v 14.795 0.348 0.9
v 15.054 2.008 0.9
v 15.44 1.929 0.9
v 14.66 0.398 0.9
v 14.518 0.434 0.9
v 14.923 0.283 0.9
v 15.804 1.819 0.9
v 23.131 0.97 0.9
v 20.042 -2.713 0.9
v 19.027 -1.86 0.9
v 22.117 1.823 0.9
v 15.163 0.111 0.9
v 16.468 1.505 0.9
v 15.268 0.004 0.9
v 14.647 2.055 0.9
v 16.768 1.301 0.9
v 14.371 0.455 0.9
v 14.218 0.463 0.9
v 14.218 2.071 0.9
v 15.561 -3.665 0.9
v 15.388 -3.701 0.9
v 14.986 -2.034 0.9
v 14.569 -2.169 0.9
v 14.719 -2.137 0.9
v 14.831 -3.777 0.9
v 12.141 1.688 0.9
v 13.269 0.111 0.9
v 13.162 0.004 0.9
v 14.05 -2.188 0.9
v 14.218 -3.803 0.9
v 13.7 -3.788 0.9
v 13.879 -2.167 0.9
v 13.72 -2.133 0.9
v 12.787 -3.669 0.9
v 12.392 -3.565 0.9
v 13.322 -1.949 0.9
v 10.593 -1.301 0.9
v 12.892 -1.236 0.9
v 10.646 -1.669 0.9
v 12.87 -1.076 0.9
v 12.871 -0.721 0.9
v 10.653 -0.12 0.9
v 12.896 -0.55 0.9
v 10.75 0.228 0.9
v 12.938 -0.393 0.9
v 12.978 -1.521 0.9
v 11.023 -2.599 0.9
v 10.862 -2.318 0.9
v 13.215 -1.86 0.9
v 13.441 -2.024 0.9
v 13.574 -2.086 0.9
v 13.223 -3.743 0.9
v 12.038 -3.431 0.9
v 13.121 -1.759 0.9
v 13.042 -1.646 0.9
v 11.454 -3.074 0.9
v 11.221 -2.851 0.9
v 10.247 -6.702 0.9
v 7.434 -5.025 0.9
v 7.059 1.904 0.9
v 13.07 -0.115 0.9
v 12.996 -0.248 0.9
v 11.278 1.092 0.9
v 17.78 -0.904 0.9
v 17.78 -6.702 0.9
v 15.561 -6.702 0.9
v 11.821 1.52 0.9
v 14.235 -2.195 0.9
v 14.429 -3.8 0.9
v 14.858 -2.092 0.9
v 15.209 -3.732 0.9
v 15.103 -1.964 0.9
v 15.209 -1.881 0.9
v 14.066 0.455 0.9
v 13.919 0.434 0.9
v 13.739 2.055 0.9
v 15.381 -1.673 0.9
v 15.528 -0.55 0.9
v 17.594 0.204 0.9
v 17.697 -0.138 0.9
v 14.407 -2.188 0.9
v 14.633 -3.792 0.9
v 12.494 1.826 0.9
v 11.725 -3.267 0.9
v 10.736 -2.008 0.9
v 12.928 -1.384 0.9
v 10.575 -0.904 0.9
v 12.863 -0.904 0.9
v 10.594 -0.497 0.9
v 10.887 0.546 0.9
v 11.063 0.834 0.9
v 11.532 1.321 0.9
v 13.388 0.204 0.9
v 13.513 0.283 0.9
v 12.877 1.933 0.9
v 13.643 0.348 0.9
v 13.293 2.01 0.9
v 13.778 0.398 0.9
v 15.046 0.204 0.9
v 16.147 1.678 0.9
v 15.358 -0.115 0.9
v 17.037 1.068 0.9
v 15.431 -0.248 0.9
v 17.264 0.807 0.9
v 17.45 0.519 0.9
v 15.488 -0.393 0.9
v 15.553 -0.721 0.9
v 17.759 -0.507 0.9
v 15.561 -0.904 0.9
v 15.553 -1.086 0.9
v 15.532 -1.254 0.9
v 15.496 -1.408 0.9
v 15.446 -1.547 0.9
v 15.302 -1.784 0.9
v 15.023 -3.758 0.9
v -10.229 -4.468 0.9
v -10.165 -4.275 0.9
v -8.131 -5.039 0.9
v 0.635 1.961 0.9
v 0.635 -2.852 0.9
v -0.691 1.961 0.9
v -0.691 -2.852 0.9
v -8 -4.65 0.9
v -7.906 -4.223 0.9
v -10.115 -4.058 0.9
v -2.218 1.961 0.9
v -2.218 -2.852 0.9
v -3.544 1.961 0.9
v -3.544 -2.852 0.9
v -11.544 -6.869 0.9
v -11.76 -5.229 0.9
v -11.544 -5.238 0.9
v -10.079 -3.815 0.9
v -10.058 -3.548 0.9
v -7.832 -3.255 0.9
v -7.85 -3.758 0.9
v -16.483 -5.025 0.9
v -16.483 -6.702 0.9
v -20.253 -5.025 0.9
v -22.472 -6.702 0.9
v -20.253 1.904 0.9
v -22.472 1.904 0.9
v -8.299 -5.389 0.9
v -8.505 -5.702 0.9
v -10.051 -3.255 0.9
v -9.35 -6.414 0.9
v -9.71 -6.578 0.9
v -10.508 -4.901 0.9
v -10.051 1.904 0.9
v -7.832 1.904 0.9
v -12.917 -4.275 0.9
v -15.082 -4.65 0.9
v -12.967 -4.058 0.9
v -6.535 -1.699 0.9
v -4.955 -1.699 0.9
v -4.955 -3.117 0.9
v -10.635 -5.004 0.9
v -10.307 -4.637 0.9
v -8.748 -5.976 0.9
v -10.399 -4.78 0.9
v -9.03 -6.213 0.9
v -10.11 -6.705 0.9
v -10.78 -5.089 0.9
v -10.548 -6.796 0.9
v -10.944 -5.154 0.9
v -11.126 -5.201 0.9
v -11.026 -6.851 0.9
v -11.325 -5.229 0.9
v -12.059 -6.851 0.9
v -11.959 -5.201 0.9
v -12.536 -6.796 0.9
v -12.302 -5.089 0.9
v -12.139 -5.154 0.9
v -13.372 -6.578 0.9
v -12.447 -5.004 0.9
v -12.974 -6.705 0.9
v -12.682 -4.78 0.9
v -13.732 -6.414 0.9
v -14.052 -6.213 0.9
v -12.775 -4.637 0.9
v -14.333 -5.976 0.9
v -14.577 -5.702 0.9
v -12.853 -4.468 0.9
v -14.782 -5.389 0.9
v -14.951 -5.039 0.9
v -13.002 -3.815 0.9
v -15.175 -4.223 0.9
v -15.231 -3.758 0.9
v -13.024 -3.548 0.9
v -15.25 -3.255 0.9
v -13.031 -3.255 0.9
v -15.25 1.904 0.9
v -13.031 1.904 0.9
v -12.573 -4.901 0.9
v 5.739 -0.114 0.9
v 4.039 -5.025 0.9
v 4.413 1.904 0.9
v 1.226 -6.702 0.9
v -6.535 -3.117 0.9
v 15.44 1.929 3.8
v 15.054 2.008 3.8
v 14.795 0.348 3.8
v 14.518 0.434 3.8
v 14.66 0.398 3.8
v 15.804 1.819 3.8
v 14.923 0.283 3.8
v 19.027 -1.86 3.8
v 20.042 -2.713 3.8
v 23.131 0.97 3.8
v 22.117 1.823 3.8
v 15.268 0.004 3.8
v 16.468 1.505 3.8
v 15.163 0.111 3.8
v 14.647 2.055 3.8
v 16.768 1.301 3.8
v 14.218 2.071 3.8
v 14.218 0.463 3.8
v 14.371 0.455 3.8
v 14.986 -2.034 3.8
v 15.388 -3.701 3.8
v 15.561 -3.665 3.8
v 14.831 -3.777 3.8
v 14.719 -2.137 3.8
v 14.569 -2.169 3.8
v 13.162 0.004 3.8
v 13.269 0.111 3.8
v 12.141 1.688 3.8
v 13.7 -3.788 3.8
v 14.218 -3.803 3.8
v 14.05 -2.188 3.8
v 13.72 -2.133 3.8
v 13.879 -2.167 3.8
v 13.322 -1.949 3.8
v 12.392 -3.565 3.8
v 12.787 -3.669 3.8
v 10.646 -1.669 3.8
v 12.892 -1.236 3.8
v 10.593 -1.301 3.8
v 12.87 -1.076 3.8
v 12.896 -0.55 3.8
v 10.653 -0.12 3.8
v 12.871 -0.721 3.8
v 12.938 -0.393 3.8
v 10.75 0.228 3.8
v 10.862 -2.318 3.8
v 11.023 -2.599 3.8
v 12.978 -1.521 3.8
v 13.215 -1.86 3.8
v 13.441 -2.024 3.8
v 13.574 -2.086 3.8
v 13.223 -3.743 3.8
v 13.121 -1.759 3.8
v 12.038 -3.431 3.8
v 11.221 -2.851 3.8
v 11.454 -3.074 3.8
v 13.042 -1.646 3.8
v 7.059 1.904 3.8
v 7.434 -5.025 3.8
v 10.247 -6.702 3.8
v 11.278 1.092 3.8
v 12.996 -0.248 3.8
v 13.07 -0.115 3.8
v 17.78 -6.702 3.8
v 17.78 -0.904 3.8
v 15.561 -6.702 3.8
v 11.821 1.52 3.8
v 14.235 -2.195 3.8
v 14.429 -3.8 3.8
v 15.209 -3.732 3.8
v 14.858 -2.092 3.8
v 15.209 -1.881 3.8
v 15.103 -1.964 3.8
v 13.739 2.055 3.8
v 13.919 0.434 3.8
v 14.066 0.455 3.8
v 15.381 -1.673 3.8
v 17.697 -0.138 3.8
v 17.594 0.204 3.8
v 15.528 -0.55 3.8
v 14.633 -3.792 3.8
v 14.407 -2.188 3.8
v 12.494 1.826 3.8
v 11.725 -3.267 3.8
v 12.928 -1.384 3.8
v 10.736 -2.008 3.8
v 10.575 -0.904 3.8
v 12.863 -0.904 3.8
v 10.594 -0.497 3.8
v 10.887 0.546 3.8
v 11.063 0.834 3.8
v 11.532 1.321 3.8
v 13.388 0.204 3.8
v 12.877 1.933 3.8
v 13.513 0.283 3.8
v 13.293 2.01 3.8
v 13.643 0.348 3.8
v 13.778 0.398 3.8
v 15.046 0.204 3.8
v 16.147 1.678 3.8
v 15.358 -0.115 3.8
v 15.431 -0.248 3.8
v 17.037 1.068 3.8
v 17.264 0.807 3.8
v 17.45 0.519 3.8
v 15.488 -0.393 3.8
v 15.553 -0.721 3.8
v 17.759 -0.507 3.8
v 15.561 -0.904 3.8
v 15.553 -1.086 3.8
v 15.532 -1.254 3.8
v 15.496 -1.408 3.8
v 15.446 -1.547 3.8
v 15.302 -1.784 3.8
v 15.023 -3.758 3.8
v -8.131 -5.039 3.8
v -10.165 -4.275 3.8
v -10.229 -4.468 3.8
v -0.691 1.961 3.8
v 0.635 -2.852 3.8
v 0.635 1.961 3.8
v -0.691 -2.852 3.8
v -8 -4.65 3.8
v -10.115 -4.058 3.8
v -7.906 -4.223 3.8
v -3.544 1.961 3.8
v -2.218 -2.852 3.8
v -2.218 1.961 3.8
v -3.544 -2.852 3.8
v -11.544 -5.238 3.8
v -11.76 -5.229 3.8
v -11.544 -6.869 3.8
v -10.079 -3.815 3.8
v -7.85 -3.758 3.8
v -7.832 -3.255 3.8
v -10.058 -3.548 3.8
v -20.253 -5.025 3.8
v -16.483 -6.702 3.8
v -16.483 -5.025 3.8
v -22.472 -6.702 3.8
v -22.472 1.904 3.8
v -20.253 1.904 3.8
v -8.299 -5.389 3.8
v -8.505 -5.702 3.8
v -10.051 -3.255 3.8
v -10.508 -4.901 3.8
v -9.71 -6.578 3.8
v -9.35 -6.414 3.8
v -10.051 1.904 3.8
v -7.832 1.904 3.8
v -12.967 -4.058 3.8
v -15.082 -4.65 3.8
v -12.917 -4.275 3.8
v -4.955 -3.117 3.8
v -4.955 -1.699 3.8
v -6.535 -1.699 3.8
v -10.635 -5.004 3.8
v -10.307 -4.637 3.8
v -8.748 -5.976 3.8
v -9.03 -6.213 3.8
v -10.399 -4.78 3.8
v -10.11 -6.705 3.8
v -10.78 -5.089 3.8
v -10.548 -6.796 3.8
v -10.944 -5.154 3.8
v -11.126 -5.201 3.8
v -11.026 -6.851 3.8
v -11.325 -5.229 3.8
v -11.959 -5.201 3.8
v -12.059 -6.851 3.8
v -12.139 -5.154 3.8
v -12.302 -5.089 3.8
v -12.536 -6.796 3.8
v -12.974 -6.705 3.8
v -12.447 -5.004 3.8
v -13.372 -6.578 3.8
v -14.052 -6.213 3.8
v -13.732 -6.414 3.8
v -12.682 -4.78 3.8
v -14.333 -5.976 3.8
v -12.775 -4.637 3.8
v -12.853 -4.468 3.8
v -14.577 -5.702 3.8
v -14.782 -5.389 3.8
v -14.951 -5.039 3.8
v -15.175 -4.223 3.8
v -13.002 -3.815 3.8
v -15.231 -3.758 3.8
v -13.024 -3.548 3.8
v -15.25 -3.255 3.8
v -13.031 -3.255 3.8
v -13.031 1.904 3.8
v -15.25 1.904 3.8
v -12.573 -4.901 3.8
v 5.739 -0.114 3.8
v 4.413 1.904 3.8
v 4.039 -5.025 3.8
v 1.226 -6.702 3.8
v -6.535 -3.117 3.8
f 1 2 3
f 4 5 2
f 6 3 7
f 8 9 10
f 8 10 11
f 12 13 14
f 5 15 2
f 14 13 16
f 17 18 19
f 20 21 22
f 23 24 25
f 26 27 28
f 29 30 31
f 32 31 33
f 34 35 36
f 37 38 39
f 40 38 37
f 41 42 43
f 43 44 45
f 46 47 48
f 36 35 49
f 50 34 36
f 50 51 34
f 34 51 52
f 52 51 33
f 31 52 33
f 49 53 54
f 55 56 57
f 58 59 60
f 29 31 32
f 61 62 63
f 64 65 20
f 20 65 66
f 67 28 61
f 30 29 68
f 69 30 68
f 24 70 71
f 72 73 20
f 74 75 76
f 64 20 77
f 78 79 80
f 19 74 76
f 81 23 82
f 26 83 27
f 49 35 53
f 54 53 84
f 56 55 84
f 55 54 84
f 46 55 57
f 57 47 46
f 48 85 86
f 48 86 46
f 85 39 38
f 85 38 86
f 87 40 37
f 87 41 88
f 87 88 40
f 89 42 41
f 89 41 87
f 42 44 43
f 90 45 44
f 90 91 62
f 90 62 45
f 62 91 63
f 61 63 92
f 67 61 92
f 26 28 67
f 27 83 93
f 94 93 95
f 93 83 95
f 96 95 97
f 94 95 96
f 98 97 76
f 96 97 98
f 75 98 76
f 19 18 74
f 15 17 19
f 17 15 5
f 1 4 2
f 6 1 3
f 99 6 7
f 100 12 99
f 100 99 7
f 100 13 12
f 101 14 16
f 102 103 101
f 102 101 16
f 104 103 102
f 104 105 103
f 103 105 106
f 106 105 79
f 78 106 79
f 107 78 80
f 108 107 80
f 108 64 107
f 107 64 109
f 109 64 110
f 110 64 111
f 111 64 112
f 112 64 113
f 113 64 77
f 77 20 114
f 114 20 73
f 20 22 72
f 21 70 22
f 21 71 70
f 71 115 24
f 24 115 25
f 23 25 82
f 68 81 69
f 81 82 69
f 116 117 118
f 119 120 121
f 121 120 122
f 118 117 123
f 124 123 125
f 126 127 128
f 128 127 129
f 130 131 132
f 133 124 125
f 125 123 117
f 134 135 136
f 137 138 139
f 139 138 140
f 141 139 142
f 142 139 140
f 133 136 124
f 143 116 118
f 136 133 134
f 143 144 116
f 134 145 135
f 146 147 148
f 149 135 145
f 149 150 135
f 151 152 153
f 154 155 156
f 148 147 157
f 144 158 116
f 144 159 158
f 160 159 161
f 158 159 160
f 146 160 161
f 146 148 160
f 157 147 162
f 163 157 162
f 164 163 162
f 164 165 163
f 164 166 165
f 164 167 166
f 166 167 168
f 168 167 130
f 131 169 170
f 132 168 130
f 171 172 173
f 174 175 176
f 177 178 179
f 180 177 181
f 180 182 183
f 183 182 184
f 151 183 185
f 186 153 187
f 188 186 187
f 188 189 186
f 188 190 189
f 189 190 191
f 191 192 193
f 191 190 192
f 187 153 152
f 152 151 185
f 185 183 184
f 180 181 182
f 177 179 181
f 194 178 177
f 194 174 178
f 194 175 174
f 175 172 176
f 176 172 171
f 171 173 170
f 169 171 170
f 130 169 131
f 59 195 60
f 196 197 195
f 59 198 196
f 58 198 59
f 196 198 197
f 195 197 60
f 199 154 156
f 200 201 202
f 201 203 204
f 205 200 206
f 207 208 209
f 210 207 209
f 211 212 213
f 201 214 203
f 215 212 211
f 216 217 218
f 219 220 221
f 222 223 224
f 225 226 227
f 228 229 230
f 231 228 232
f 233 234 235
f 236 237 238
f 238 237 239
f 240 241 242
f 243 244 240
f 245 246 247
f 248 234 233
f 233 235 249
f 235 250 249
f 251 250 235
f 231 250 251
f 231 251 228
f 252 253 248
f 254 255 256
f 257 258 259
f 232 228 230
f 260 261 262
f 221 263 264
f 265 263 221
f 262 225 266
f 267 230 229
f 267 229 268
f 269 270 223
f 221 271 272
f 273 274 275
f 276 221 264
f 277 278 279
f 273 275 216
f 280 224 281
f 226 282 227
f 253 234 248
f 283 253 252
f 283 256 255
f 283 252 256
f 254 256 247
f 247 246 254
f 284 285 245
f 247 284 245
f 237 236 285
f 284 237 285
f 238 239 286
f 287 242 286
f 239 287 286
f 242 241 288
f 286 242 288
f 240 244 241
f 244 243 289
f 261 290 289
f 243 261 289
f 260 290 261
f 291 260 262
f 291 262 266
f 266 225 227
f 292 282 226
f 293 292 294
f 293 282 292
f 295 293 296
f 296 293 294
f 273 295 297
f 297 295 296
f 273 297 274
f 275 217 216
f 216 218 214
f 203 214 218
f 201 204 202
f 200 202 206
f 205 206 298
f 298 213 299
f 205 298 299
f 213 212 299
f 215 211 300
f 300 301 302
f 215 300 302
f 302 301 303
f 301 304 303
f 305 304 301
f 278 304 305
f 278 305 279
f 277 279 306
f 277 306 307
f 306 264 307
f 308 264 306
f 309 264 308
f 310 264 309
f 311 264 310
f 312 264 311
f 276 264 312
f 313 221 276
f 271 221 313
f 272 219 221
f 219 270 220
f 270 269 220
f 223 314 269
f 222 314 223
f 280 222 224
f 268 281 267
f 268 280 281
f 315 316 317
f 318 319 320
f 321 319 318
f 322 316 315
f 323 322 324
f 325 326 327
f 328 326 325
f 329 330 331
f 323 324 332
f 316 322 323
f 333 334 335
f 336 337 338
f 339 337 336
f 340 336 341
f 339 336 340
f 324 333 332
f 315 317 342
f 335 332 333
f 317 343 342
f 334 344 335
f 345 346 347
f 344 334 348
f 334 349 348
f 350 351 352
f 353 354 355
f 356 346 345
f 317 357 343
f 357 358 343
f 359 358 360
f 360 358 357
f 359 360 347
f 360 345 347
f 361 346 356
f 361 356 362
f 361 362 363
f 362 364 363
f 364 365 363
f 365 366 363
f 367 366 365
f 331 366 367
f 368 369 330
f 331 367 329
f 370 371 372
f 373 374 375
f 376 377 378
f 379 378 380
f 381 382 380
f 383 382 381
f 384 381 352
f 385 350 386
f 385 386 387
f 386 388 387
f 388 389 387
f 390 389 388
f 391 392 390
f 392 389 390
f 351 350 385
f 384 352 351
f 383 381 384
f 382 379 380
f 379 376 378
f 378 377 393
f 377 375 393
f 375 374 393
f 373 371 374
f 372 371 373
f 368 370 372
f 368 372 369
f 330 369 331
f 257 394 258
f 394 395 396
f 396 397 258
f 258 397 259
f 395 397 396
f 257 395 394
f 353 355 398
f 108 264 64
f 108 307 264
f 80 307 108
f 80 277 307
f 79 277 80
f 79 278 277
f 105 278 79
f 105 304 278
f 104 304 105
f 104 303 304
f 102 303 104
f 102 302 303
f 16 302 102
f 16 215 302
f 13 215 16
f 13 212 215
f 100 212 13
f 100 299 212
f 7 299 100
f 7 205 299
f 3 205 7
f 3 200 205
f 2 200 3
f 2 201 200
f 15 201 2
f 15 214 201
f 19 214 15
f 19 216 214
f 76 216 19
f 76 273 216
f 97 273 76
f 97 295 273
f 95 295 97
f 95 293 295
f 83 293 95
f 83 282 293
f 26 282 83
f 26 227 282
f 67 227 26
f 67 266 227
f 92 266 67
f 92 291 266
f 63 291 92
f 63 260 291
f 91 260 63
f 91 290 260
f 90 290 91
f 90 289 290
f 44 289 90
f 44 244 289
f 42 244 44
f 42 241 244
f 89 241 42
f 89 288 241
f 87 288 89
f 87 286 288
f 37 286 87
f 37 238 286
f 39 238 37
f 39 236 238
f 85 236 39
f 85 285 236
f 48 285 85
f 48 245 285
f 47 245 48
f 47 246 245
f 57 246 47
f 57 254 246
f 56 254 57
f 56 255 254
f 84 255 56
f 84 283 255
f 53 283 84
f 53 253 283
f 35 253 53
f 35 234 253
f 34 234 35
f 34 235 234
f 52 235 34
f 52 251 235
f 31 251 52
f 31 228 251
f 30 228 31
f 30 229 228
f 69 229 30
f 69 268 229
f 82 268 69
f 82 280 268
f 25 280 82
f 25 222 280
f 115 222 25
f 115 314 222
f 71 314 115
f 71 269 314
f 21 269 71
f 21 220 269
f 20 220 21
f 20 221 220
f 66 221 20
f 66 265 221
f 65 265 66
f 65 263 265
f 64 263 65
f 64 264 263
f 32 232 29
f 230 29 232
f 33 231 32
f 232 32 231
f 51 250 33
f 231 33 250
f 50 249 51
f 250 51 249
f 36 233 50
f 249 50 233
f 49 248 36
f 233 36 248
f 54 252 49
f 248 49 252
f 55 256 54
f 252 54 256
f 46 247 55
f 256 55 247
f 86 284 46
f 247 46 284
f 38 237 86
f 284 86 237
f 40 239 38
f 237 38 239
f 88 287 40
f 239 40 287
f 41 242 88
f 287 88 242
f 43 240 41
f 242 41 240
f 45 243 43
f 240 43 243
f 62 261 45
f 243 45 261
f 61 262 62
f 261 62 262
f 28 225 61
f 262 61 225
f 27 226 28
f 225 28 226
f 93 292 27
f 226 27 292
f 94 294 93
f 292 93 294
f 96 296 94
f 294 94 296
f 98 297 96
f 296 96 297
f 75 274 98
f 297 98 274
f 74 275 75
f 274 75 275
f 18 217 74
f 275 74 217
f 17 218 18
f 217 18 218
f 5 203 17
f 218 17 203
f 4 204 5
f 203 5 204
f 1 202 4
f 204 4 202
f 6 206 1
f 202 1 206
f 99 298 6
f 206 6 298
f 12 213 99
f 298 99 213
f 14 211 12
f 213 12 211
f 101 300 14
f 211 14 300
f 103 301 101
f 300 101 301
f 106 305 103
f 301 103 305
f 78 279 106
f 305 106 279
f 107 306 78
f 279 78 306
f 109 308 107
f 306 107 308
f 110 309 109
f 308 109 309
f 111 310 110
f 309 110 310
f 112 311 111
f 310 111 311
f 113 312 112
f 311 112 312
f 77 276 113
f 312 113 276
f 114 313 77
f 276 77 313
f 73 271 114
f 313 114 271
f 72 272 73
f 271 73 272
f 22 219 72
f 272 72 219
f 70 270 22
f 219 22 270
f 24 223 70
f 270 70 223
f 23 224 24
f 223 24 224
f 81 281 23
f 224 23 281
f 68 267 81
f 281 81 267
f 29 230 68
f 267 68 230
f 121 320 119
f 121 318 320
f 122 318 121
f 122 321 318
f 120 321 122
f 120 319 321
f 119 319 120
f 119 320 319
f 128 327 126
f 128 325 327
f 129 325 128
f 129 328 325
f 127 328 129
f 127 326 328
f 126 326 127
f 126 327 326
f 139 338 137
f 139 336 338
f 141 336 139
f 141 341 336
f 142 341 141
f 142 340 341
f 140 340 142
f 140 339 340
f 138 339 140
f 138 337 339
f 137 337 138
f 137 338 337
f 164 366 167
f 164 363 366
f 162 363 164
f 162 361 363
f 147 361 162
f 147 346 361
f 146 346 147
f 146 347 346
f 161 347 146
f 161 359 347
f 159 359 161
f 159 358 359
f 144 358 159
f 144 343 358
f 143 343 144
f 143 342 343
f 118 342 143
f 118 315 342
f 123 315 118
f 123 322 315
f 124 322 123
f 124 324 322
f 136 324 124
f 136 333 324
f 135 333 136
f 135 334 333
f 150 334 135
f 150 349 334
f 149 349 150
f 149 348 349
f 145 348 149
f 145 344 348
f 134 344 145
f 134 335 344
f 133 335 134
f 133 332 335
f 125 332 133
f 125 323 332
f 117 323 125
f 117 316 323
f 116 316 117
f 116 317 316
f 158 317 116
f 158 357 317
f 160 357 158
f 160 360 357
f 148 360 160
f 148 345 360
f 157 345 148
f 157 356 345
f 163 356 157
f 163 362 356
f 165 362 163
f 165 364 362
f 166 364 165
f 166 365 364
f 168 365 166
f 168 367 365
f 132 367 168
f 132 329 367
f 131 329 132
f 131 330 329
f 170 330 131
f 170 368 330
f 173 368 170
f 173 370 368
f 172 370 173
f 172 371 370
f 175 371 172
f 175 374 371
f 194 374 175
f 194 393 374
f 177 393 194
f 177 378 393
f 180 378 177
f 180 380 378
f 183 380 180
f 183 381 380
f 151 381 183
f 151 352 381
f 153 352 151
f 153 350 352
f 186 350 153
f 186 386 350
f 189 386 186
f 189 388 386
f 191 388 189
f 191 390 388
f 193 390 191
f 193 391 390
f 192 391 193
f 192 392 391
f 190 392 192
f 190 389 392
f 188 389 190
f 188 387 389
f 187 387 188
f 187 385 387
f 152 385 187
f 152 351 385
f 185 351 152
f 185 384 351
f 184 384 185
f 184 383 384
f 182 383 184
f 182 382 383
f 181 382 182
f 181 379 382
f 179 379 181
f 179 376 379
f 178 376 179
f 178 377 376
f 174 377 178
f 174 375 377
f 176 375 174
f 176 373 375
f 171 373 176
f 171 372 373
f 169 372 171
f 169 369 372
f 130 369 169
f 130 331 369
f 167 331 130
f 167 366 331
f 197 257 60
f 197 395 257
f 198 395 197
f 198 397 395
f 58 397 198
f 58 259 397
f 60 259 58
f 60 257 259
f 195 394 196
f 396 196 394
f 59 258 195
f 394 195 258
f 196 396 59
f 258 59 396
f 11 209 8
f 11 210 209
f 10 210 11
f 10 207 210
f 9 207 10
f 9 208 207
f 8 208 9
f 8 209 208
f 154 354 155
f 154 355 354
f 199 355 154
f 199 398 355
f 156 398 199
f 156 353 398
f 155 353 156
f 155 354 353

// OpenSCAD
$fn = 48;
  // syllabics (overlaid on icon, tallest) — row 2
  translate([0, -2.500, 0.900]) linear_extrude(height=2.900) text("ᒪᑘᐦᐃᑫᐟ", size=8.500, halign="center", valign="center", font="Euphemia UCAS:style=Bold");
